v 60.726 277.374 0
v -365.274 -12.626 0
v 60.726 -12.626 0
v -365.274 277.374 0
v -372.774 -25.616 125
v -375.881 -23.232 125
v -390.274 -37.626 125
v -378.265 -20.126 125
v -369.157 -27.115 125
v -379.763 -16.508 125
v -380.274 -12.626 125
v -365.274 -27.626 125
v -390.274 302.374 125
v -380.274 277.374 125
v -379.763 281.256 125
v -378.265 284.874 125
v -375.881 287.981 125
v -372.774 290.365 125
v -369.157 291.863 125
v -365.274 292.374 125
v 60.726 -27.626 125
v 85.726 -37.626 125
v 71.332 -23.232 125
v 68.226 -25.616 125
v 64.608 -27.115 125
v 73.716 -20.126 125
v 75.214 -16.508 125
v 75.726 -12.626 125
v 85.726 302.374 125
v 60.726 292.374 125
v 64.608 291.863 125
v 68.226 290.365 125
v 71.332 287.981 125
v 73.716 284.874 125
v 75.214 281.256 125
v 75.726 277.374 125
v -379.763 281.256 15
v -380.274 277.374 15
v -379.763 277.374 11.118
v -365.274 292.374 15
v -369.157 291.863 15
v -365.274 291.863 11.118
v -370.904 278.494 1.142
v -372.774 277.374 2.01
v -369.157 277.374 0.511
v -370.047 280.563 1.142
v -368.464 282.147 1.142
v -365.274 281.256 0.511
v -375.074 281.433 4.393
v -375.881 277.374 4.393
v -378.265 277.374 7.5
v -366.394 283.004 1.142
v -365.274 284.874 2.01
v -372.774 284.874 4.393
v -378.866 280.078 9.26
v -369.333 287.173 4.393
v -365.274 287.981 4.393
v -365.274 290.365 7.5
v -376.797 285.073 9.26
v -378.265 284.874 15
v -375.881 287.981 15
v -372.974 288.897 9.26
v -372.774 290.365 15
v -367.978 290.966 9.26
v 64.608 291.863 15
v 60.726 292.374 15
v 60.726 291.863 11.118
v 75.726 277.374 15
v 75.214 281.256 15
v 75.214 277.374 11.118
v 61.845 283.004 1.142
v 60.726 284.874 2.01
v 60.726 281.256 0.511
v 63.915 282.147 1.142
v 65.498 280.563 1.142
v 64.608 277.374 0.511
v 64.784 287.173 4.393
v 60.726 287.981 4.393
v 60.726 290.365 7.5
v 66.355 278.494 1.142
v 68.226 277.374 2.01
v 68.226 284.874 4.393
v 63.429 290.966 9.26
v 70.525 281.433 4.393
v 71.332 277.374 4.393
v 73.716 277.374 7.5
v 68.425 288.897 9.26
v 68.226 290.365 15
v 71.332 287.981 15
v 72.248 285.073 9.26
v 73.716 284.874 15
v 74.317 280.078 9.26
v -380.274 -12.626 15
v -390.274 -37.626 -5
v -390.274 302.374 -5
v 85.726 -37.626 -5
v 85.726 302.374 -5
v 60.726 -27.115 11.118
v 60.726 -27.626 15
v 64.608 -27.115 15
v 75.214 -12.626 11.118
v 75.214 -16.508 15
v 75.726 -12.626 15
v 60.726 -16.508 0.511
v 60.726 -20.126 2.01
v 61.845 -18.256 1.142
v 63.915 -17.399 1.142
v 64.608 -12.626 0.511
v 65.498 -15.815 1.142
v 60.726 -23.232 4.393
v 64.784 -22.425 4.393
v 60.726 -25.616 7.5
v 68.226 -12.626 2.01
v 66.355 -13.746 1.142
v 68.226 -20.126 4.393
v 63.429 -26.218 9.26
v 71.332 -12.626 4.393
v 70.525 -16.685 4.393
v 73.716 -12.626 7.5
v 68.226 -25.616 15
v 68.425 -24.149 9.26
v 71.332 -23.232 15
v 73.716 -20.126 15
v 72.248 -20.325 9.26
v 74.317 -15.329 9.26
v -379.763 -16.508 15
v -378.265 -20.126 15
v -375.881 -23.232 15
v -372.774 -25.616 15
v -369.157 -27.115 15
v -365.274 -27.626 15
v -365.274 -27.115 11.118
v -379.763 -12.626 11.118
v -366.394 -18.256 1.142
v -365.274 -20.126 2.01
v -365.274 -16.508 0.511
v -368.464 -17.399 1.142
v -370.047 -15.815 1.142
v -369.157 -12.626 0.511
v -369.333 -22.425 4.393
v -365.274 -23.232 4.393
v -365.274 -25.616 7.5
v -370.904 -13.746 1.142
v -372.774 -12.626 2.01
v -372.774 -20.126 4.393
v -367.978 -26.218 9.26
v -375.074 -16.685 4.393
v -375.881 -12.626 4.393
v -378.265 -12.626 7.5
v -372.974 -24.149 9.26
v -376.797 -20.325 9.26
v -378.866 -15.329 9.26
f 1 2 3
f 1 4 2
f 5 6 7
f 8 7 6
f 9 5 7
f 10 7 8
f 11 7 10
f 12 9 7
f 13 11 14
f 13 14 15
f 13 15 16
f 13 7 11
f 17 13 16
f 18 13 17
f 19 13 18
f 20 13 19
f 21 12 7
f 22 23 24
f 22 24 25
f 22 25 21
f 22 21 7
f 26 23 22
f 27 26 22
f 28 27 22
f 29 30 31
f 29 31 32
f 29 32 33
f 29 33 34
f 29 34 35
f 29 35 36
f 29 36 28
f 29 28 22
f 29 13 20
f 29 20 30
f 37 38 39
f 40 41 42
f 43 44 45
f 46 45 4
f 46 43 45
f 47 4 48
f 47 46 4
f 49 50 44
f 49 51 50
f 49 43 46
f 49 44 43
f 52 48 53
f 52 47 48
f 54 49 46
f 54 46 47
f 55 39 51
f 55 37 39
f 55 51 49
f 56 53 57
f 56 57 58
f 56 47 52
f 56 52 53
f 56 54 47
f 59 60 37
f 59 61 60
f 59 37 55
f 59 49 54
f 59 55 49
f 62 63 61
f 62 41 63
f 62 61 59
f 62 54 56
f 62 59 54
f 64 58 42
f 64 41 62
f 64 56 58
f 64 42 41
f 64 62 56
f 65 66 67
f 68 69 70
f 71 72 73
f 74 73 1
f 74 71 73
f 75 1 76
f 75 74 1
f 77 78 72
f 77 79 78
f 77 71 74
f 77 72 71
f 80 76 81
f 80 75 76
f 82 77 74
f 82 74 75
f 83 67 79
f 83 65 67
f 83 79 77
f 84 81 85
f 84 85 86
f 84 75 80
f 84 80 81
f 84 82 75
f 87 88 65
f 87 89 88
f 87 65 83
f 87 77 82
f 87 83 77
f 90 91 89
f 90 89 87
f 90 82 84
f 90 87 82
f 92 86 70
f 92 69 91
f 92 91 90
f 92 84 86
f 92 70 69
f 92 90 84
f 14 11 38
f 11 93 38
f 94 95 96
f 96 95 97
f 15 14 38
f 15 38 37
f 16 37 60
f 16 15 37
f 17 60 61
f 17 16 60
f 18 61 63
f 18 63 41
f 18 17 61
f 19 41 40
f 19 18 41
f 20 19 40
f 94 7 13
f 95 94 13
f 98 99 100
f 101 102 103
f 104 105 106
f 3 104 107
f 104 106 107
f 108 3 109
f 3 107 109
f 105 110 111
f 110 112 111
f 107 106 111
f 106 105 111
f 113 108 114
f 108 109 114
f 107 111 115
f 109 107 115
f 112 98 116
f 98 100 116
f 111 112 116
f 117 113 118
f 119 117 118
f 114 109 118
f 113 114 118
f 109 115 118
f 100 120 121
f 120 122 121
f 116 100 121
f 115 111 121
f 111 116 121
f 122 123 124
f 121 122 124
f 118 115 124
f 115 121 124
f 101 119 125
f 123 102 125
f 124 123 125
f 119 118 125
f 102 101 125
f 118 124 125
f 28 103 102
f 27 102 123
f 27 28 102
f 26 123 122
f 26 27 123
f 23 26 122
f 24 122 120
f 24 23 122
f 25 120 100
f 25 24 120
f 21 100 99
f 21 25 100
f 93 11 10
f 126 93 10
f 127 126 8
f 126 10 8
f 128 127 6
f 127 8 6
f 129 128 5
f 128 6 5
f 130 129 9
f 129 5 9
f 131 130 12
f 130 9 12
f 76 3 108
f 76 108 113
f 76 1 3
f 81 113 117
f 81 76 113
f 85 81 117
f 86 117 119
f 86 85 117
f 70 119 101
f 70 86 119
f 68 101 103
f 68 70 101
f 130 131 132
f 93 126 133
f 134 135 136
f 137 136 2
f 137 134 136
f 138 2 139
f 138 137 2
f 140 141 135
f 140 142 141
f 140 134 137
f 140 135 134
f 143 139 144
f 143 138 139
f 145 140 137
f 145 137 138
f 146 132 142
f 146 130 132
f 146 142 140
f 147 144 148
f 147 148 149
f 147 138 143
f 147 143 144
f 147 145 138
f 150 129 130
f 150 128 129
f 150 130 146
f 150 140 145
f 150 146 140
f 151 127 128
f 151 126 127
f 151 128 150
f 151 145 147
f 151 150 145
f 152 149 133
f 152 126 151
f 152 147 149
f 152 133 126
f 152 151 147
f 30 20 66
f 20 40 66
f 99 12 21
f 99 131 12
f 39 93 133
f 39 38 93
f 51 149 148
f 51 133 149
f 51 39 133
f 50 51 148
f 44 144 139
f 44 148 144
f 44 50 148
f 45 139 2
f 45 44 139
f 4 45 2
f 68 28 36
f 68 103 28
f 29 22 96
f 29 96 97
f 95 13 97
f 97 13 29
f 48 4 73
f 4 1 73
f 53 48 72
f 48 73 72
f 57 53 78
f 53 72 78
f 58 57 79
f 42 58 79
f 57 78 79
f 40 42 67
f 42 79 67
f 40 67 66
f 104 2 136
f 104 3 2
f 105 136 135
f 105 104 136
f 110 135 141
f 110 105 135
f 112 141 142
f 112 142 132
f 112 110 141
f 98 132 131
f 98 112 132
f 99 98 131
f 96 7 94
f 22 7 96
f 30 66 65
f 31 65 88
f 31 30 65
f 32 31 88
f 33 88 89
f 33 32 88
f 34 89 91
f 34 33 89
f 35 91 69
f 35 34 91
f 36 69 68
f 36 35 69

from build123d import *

# Parameters (mm, degrees)
F0_W     = 476
F0_H     = 340
F0_W_2   = 456
F0_H_2   = 320
F1_DEPTH = 125
F2_DEPTH = 5
F3_R     = 15


with BuildPart() as f1:
    # F0 (on Top) → F1 (new body)
    with BuildSketch(Plane.XY):
        with Locations((-152.2744732499, 132.3741256595)):
            Rectangle(F0_W, F0_H)
        with Locations((-152.2744732499, 132.3741256595)):
            Rectangle(F0_W_2, F0_H_2, mode=Mode.SUBTRACT)
    extrude(amount=F1_DEPTH)

    # F0 (on Top) → F2 (join)
    with BuildSketch(Plane.XY):
        with Locations((-152.2744732499, 132.3741256595)):
            Rectangle(F0_W, F0_H)
        with Locations((-152.2744732499, 132.3741256595)):
            Rectangle(F0_W_2, F0_H_2, mode=Mode.SUBTRACT)
        with Locations((-152.2744732499, 132.3741256595)):
            Rectangle(F0_W_2, F0_H_2)
    extrude(amount=-F2_DEPTH)

    # F3
    f3_edges = [f1.edges().sort_by_distance(p)[0] for p in [
        (75.725527, 292.374126, 62.5),
        (-380.274473, 292.374126, 62.5),
        (75.725527, -27.625874, 62.5),
        (-380.274473, -27.625874, 62.5),
        (-152.274473, -27.625874, 0),
        (-380.274473, 132.374126, 0),
        (-152.274473, 292.374126, 0),
        (75.725527, 132.374126, 0),
    ]]
    fillet(f3_edges, radius=F3_R)


solid = f1.part
